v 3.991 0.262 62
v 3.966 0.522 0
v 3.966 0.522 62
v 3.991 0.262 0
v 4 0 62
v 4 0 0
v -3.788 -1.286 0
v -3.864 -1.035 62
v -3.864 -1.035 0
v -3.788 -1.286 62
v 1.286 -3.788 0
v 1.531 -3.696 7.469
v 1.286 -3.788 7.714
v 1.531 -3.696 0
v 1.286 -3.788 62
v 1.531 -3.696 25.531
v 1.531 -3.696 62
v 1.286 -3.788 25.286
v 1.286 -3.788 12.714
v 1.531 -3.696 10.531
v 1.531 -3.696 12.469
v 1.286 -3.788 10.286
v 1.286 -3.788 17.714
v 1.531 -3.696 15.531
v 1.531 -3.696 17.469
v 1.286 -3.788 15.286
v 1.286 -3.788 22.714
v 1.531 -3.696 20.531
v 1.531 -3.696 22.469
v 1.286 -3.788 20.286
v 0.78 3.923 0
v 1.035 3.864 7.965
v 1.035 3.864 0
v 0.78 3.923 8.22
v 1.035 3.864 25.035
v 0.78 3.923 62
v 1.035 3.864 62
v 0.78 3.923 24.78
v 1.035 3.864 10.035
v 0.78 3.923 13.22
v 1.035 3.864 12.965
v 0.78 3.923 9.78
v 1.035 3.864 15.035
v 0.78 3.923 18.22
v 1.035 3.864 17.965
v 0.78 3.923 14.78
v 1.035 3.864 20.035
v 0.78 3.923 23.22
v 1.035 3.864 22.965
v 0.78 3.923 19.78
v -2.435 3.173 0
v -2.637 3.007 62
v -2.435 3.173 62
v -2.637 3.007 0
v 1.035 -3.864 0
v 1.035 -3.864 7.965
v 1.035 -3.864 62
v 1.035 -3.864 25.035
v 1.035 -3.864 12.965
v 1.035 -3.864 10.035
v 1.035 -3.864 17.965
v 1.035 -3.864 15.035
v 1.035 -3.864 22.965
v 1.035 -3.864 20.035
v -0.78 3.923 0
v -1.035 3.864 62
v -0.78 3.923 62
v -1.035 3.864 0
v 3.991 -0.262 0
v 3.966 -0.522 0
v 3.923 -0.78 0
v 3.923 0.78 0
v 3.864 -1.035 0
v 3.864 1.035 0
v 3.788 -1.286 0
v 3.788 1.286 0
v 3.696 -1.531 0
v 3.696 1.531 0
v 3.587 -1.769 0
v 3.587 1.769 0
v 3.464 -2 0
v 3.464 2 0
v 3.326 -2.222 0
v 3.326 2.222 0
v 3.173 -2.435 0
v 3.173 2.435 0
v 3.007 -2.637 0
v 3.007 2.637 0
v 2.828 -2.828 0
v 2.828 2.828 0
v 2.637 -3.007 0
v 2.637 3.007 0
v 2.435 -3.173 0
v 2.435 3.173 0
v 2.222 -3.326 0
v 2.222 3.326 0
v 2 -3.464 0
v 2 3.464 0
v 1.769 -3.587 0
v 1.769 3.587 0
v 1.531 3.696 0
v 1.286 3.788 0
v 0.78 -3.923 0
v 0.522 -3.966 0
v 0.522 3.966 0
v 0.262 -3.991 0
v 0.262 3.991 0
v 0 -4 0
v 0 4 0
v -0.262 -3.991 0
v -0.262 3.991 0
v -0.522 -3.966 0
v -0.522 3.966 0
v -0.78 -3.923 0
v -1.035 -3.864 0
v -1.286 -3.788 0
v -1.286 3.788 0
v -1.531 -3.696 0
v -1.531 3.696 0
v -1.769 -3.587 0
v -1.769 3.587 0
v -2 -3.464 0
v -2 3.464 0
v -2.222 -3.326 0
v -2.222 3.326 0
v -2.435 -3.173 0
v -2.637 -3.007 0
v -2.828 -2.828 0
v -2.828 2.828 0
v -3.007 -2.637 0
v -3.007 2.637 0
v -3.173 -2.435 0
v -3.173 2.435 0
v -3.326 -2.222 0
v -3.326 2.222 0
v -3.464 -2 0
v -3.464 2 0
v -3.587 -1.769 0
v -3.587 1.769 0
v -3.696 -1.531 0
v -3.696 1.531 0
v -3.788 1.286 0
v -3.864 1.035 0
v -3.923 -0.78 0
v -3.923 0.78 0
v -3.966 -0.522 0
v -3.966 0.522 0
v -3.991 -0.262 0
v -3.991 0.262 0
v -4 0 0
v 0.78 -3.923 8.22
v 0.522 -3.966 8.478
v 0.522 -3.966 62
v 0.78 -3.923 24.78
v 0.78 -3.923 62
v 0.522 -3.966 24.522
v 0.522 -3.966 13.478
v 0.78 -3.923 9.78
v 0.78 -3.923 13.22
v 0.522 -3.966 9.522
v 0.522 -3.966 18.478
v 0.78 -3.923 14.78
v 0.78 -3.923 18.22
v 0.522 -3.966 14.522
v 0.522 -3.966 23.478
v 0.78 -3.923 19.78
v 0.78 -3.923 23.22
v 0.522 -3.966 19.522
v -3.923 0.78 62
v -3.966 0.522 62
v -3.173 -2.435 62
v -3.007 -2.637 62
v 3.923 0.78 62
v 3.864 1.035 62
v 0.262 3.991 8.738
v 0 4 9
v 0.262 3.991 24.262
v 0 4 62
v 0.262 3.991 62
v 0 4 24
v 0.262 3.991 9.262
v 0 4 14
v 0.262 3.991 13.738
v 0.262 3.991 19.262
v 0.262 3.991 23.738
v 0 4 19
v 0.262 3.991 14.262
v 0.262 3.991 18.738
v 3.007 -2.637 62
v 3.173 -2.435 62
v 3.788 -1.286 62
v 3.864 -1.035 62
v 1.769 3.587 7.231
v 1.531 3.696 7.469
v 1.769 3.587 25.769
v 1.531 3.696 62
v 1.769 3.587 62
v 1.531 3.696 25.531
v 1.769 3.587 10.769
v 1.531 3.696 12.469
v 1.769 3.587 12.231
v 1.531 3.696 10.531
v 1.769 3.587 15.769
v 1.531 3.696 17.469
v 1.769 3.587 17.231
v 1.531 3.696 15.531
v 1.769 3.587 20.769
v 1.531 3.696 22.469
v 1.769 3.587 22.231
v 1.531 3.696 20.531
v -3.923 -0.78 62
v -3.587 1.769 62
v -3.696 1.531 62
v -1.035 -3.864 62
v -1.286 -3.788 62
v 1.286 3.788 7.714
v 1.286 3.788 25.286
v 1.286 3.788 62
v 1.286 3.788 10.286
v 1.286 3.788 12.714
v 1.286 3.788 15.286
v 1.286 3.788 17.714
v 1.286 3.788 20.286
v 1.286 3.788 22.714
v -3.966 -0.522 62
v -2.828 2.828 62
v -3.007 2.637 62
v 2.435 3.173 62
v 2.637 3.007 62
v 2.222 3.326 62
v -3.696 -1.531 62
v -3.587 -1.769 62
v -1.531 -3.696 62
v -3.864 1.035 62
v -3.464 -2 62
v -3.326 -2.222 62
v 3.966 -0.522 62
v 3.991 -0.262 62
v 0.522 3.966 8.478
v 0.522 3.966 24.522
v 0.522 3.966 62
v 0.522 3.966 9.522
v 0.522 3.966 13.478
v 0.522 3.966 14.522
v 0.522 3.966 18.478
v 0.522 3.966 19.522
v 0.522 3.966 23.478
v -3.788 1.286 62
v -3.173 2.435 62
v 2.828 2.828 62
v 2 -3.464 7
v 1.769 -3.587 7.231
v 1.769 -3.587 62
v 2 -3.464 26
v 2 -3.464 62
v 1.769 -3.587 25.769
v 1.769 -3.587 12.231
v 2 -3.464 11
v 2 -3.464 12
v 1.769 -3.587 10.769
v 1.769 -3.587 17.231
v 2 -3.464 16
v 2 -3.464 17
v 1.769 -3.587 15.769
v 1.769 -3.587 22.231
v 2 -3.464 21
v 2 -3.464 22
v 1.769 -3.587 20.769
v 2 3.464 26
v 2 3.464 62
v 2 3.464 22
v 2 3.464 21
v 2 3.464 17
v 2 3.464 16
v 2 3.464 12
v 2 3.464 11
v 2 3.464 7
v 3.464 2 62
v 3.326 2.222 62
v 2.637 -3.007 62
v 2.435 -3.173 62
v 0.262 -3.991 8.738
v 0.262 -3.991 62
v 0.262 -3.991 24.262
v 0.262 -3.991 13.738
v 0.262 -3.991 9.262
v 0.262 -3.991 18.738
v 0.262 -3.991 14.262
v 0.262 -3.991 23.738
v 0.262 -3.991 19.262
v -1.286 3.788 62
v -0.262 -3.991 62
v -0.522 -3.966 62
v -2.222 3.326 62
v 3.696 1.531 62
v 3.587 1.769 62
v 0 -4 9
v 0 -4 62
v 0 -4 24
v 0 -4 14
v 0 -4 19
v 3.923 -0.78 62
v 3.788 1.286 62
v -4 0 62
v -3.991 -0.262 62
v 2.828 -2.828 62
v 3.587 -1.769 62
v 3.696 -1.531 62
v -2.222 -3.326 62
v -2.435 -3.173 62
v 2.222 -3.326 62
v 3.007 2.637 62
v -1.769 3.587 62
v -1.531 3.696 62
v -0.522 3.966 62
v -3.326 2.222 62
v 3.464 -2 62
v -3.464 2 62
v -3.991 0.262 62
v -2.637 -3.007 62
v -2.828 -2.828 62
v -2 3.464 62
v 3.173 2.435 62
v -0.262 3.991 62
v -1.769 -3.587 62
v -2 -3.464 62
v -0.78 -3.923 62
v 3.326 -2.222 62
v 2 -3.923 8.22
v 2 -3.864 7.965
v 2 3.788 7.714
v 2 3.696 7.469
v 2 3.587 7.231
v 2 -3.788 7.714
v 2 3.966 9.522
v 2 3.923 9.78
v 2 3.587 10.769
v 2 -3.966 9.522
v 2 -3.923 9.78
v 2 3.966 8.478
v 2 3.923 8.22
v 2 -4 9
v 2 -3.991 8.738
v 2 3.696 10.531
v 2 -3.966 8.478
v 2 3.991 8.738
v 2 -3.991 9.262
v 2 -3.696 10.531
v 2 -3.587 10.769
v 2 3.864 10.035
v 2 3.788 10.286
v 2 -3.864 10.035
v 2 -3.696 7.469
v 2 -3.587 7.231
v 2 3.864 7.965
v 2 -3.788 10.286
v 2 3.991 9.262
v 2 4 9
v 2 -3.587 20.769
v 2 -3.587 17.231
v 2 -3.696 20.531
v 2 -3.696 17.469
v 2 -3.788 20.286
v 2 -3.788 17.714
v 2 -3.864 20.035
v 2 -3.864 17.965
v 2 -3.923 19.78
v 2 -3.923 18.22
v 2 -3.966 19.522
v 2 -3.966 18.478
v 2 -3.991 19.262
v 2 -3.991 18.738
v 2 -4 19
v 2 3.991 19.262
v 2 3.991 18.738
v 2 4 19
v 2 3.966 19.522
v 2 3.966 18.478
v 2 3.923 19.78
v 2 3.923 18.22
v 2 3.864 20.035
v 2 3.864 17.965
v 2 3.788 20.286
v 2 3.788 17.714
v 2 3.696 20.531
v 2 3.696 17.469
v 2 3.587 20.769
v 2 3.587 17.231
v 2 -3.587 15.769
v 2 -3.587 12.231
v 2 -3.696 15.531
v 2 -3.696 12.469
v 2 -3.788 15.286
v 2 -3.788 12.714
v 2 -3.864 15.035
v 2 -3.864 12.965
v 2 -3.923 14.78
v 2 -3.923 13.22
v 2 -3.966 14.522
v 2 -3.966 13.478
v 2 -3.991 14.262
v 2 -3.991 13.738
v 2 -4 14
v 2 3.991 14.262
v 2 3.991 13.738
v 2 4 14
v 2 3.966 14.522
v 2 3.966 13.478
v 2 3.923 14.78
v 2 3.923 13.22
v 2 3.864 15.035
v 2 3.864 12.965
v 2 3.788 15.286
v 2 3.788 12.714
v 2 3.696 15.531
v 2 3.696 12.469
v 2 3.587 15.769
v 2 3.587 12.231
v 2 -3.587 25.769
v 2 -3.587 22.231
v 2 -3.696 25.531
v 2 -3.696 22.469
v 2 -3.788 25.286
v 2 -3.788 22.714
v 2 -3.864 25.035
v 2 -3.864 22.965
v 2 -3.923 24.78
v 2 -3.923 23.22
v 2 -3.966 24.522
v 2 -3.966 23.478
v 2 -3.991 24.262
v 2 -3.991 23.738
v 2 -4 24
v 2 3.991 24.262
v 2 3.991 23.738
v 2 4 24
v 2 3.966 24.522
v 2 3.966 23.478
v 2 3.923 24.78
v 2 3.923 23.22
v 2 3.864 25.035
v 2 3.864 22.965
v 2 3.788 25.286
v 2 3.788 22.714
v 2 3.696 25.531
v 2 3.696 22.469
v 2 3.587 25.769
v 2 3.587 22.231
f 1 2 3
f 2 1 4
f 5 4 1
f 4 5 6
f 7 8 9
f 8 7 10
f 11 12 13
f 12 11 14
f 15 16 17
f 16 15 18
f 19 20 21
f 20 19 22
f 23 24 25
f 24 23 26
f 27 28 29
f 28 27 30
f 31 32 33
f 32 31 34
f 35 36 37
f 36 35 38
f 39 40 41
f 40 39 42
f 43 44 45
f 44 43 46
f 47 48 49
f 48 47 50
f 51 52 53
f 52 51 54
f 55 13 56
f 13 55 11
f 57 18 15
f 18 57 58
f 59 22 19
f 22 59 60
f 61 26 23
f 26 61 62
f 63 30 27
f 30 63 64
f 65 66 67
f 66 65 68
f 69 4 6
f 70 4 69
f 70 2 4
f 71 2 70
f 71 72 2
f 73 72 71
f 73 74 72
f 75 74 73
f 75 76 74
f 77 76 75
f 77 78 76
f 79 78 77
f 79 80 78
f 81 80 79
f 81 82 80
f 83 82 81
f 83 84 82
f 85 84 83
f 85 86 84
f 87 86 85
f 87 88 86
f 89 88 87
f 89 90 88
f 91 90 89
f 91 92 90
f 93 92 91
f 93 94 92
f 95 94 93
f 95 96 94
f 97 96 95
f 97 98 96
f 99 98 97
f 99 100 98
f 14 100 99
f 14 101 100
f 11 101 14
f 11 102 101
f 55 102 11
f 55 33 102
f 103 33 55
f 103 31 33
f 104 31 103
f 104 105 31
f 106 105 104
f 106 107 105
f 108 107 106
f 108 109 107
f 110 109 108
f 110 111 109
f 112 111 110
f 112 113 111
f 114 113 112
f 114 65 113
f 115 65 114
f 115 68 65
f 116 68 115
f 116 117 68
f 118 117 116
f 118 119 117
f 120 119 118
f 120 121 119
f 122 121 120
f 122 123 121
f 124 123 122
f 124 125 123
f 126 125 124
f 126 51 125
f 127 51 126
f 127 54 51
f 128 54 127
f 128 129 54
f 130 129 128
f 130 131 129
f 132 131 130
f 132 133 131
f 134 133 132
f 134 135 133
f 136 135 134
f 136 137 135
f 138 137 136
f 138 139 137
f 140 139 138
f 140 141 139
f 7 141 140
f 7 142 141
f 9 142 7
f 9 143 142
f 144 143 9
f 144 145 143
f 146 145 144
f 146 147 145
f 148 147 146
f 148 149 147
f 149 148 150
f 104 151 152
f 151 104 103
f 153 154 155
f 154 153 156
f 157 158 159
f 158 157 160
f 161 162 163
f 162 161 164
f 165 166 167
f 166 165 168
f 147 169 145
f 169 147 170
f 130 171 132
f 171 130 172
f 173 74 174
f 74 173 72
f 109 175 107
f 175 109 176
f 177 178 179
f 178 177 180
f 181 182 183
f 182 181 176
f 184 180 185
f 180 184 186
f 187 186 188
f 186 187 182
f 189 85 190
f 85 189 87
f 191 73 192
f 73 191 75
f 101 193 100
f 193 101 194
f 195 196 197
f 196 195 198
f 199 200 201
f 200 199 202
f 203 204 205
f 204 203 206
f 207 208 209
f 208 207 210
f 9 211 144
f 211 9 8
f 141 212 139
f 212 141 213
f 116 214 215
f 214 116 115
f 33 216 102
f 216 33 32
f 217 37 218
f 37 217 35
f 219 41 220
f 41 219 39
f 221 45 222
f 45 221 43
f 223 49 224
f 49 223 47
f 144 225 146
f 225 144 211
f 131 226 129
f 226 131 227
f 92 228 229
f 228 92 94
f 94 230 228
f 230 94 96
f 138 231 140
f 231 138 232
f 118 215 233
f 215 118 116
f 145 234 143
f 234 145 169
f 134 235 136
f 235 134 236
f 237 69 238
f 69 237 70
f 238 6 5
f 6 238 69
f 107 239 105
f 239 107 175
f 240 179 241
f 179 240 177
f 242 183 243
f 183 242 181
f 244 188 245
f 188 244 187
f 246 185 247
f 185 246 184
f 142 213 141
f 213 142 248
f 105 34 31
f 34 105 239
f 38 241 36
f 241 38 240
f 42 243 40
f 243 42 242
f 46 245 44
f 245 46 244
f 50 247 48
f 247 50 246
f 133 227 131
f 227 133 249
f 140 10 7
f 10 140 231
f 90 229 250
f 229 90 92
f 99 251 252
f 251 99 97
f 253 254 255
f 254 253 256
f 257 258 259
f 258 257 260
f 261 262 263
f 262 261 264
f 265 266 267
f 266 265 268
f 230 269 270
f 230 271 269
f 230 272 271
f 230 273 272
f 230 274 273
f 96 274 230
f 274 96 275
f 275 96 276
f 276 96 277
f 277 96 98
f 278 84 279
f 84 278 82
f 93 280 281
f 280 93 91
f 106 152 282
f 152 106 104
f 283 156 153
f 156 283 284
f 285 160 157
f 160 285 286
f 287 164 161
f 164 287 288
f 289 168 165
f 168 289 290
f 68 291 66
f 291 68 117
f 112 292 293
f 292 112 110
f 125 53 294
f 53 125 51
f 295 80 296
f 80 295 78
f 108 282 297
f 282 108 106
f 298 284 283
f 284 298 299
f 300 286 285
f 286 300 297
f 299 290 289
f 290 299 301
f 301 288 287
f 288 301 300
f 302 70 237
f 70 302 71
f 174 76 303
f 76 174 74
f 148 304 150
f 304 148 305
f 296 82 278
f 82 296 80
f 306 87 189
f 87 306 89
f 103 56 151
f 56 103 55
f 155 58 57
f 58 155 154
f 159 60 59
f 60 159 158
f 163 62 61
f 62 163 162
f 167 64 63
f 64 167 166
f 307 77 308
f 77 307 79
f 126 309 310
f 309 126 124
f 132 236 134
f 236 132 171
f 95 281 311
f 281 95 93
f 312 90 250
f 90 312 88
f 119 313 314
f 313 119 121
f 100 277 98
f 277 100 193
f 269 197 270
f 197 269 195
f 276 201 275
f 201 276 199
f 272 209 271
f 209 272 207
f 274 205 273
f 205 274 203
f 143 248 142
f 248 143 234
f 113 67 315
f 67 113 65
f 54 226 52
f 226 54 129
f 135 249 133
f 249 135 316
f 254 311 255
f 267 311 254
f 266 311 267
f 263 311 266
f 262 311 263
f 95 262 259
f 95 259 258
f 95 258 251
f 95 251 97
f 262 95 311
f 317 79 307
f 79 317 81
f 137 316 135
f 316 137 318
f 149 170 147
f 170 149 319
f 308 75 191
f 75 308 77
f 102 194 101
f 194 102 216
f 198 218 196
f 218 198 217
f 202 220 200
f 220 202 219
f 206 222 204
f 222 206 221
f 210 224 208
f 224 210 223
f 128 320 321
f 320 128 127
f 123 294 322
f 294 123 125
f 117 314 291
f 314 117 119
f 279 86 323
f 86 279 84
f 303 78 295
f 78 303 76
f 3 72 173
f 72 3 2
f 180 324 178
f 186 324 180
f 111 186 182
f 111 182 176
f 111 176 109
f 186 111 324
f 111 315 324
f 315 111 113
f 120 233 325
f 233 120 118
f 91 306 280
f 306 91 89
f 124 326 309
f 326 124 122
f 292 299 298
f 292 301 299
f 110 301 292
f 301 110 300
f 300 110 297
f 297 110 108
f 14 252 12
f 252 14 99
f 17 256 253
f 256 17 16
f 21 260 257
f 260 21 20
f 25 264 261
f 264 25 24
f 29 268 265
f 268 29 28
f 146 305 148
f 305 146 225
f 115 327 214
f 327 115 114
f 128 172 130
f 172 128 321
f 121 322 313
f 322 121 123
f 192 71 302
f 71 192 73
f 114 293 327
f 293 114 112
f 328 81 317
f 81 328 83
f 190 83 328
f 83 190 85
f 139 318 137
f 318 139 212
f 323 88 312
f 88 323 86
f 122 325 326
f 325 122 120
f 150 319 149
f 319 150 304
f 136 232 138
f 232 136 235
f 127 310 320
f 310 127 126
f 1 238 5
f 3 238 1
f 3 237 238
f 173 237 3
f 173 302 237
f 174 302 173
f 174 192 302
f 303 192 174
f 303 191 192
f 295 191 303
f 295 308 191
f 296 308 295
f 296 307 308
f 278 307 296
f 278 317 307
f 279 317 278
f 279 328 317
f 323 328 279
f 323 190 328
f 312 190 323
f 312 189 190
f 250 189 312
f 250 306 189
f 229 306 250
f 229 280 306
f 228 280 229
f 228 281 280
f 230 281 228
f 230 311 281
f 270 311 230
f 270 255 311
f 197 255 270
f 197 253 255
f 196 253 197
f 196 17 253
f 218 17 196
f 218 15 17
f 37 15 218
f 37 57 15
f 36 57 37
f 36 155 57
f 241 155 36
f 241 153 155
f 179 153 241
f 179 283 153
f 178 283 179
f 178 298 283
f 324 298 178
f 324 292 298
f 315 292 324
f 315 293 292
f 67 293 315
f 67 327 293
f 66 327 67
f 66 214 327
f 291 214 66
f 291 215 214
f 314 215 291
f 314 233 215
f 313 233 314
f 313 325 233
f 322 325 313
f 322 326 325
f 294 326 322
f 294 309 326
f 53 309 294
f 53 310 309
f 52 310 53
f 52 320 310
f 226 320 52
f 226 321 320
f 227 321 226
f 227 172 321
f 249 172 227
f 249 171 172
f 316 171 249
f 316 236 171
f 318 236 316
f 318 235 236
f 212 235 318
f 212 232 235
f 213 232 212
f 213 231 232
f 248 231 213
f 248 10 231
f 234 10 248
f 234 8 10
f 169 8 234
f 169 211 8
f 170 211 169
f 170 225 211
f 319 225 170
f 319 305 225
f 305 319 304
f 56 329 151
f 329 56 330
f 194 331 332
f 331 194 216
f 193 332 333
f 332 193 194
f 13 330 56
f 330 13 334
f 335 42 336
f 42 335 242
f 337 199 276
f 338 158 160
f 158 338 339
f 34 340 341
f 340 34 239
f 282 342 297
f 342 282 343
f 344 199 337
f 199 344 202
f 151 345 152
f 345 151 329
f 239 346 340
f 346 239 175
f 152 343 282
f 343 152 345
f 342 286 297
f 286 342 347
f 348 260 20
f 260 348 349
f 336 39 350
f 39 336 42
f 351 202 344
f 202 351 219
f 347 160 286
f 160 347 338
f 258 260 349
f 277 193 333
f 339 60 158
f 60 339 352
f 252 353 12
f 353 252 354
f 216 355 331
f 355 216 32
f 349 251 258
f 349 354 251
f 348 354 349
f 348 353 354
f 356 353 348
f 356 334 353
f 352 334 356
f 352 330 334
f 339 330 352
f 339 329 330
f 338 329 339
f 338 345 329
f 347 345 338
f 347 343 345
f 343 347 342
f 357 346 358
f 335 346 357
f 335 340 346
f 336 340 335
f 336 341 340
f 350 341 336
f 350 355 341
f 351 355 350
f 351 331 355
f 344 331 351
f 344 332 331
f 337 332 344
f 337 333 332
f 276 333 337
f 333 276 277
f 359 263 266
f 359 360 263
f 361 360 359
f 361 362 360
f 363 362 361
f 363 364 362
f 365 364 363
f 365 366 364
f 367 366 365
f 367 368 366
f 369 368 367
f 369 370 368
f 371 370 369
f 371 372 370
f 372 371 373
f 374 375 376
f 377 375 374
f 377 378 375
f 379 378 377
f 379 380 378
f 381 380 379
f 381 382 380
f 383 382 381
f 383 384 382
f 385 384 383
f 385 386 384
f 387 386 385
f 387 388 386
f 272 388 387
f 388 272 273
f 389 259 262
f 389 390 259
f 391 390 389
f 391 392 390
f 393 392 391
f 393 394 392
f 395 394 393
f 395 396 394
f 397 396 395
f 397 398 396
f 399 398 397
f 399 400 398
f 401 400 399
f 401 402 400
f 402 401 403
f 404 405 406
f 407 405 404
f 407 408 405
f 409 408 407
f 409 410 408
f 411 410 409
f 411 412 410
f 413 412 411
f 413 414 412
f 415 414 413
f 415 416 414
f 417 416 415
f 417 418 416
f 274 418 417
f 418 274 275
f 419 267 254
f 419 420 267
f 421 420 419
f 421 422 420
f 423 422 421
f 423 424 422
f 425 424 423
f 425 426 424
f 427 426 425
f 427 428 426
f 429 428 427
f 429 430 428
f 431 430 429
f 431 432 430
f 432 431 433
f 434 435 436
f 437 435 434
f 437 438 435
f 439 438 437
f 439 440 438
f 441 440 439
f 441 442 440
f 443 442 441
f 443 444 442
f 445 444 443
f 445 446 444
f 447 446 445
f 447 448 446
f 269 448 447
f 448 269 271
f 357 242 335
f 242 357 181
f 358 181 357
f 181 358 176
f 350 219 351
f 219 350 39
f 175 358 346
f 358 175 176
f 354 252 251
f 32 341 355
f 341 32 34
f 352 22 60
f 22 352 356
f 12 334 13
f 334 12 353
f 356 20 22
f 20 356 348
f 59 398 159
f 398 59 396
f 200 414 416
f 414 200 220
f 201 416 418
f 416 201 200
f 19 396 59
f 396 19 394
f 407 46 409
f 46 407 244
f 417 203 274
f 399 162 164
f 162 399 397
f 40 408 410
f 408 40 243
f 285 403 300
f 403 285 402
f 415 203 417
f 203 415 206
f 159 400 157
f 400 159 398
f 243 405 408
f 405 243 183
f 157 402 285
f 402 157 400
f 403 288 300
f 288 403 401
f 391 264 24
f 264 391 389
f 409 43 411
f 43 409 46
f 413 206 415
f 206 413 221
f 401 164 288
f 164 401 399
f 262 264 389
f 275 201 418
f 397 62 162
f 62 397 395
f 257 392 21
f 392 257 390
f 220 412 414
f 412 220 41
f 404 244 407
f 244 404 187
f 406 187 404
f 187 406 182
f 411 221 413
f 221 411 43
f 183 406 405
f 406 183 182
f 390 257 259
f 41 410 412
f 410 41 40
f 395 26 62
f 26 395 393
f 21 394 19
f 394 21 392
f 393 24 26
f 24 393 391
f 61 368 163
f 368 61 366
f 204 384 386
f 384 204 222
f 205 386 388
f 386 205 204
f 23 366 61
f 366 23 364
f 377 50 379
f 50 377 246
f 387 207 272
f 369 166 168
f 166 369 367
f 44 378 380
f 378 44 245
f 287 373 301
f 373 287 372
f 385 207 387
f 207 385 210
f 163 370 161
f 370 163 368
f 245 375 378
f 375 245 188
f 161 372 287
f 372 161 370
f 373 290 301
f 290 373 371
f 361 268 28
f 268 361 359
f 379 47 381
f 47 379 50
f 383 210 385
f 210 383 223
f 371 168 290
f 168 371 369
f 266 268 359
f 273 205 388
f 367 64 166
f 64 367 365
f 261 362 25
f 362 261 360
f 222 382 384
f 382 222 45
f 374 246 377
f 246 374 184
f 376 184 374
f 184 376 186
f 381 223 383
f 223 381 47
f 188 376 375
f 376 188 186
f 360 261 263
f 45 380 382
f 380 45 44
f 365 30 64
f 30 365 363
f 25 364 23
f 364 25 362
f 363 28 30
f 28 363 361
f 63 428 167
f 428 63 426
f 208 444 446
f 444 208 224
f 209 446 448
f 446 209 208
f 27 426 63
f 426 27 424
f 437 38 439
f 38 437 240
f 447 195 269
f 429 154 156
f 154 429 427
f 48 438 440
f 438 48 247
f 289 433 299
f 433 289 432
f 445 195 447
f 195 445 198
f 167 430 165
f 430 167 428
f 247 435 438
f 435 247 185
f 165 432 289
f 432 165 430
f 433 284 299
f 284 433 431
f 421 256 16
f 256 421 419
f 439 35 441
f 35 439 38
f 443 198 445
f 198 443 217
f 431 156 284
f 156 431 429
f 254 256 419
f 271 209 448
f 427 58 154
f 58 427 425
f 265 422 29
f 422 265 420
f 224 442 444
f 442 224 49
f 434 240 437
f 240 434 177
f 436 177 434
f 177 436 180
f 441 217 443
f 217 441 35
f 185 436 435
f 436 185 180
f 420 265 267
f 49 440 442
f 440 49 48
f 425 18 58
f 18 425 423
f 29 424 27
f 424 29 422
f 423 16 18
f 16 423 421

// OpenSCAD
// Pestle for 1.5 mL microcentrifuge tube
// Print orientation: standing upright on the handle

// ---- Dimensions (mm) ----
handle_d      = 8;     // handle diameter
handle_h      = 45;    // handle height (z = 0 to 45)
cone_start_d  = 8;     // cone diameter at z = 45
cone_end_d    = 3;     // cone diameter at z = 62
cone_h        = 17;    // cone height (62 - 45)
tip_d         = 3;     // tip sphere diameter
tip_z         = 62;    // tip sphere centre height
groove_w      = 2;     // groove width (Z)
groove_depth  = 1;     // groove depth from surface
groove_z      = [10, 15, 20, 25]; // groove centre heights
eps           = 0.5;   // cutter overshoot past faces

$fn = 96;

// ---- Model ----
union() {
    // Handle
    cylinder(d = handle_d, h = handle_h);

    // Cone (tapers from 8 mm to 3 mm over 17 mm)
    translate([0, 0, handle_h])
        linear_extrude(cone_h)
            circle(d = cone_start_d);
    translate([0, 0, handle_h + cone_h])
        linear_extrude(-cone_h)
            circle(d = cone_end_d);

    // Rounded tip: sphere centred at z = 62
    translate([0, 0, tip_z - tip_d / 2])
        sphere(d = tip_d);
}

// ---- Grip grooves ----
for (z = groove_z)
    translate([0, 0, z - groove_w / 2])
        rotate([0, 90, 0])
            difference() {
                cylinder(h = groove_w, d = handle_d);
                translate([0, 0, -eps])
                    cylinder(h = groove_w + 2 * eps, d = handle_d - 2 * groove_depth);
            }
